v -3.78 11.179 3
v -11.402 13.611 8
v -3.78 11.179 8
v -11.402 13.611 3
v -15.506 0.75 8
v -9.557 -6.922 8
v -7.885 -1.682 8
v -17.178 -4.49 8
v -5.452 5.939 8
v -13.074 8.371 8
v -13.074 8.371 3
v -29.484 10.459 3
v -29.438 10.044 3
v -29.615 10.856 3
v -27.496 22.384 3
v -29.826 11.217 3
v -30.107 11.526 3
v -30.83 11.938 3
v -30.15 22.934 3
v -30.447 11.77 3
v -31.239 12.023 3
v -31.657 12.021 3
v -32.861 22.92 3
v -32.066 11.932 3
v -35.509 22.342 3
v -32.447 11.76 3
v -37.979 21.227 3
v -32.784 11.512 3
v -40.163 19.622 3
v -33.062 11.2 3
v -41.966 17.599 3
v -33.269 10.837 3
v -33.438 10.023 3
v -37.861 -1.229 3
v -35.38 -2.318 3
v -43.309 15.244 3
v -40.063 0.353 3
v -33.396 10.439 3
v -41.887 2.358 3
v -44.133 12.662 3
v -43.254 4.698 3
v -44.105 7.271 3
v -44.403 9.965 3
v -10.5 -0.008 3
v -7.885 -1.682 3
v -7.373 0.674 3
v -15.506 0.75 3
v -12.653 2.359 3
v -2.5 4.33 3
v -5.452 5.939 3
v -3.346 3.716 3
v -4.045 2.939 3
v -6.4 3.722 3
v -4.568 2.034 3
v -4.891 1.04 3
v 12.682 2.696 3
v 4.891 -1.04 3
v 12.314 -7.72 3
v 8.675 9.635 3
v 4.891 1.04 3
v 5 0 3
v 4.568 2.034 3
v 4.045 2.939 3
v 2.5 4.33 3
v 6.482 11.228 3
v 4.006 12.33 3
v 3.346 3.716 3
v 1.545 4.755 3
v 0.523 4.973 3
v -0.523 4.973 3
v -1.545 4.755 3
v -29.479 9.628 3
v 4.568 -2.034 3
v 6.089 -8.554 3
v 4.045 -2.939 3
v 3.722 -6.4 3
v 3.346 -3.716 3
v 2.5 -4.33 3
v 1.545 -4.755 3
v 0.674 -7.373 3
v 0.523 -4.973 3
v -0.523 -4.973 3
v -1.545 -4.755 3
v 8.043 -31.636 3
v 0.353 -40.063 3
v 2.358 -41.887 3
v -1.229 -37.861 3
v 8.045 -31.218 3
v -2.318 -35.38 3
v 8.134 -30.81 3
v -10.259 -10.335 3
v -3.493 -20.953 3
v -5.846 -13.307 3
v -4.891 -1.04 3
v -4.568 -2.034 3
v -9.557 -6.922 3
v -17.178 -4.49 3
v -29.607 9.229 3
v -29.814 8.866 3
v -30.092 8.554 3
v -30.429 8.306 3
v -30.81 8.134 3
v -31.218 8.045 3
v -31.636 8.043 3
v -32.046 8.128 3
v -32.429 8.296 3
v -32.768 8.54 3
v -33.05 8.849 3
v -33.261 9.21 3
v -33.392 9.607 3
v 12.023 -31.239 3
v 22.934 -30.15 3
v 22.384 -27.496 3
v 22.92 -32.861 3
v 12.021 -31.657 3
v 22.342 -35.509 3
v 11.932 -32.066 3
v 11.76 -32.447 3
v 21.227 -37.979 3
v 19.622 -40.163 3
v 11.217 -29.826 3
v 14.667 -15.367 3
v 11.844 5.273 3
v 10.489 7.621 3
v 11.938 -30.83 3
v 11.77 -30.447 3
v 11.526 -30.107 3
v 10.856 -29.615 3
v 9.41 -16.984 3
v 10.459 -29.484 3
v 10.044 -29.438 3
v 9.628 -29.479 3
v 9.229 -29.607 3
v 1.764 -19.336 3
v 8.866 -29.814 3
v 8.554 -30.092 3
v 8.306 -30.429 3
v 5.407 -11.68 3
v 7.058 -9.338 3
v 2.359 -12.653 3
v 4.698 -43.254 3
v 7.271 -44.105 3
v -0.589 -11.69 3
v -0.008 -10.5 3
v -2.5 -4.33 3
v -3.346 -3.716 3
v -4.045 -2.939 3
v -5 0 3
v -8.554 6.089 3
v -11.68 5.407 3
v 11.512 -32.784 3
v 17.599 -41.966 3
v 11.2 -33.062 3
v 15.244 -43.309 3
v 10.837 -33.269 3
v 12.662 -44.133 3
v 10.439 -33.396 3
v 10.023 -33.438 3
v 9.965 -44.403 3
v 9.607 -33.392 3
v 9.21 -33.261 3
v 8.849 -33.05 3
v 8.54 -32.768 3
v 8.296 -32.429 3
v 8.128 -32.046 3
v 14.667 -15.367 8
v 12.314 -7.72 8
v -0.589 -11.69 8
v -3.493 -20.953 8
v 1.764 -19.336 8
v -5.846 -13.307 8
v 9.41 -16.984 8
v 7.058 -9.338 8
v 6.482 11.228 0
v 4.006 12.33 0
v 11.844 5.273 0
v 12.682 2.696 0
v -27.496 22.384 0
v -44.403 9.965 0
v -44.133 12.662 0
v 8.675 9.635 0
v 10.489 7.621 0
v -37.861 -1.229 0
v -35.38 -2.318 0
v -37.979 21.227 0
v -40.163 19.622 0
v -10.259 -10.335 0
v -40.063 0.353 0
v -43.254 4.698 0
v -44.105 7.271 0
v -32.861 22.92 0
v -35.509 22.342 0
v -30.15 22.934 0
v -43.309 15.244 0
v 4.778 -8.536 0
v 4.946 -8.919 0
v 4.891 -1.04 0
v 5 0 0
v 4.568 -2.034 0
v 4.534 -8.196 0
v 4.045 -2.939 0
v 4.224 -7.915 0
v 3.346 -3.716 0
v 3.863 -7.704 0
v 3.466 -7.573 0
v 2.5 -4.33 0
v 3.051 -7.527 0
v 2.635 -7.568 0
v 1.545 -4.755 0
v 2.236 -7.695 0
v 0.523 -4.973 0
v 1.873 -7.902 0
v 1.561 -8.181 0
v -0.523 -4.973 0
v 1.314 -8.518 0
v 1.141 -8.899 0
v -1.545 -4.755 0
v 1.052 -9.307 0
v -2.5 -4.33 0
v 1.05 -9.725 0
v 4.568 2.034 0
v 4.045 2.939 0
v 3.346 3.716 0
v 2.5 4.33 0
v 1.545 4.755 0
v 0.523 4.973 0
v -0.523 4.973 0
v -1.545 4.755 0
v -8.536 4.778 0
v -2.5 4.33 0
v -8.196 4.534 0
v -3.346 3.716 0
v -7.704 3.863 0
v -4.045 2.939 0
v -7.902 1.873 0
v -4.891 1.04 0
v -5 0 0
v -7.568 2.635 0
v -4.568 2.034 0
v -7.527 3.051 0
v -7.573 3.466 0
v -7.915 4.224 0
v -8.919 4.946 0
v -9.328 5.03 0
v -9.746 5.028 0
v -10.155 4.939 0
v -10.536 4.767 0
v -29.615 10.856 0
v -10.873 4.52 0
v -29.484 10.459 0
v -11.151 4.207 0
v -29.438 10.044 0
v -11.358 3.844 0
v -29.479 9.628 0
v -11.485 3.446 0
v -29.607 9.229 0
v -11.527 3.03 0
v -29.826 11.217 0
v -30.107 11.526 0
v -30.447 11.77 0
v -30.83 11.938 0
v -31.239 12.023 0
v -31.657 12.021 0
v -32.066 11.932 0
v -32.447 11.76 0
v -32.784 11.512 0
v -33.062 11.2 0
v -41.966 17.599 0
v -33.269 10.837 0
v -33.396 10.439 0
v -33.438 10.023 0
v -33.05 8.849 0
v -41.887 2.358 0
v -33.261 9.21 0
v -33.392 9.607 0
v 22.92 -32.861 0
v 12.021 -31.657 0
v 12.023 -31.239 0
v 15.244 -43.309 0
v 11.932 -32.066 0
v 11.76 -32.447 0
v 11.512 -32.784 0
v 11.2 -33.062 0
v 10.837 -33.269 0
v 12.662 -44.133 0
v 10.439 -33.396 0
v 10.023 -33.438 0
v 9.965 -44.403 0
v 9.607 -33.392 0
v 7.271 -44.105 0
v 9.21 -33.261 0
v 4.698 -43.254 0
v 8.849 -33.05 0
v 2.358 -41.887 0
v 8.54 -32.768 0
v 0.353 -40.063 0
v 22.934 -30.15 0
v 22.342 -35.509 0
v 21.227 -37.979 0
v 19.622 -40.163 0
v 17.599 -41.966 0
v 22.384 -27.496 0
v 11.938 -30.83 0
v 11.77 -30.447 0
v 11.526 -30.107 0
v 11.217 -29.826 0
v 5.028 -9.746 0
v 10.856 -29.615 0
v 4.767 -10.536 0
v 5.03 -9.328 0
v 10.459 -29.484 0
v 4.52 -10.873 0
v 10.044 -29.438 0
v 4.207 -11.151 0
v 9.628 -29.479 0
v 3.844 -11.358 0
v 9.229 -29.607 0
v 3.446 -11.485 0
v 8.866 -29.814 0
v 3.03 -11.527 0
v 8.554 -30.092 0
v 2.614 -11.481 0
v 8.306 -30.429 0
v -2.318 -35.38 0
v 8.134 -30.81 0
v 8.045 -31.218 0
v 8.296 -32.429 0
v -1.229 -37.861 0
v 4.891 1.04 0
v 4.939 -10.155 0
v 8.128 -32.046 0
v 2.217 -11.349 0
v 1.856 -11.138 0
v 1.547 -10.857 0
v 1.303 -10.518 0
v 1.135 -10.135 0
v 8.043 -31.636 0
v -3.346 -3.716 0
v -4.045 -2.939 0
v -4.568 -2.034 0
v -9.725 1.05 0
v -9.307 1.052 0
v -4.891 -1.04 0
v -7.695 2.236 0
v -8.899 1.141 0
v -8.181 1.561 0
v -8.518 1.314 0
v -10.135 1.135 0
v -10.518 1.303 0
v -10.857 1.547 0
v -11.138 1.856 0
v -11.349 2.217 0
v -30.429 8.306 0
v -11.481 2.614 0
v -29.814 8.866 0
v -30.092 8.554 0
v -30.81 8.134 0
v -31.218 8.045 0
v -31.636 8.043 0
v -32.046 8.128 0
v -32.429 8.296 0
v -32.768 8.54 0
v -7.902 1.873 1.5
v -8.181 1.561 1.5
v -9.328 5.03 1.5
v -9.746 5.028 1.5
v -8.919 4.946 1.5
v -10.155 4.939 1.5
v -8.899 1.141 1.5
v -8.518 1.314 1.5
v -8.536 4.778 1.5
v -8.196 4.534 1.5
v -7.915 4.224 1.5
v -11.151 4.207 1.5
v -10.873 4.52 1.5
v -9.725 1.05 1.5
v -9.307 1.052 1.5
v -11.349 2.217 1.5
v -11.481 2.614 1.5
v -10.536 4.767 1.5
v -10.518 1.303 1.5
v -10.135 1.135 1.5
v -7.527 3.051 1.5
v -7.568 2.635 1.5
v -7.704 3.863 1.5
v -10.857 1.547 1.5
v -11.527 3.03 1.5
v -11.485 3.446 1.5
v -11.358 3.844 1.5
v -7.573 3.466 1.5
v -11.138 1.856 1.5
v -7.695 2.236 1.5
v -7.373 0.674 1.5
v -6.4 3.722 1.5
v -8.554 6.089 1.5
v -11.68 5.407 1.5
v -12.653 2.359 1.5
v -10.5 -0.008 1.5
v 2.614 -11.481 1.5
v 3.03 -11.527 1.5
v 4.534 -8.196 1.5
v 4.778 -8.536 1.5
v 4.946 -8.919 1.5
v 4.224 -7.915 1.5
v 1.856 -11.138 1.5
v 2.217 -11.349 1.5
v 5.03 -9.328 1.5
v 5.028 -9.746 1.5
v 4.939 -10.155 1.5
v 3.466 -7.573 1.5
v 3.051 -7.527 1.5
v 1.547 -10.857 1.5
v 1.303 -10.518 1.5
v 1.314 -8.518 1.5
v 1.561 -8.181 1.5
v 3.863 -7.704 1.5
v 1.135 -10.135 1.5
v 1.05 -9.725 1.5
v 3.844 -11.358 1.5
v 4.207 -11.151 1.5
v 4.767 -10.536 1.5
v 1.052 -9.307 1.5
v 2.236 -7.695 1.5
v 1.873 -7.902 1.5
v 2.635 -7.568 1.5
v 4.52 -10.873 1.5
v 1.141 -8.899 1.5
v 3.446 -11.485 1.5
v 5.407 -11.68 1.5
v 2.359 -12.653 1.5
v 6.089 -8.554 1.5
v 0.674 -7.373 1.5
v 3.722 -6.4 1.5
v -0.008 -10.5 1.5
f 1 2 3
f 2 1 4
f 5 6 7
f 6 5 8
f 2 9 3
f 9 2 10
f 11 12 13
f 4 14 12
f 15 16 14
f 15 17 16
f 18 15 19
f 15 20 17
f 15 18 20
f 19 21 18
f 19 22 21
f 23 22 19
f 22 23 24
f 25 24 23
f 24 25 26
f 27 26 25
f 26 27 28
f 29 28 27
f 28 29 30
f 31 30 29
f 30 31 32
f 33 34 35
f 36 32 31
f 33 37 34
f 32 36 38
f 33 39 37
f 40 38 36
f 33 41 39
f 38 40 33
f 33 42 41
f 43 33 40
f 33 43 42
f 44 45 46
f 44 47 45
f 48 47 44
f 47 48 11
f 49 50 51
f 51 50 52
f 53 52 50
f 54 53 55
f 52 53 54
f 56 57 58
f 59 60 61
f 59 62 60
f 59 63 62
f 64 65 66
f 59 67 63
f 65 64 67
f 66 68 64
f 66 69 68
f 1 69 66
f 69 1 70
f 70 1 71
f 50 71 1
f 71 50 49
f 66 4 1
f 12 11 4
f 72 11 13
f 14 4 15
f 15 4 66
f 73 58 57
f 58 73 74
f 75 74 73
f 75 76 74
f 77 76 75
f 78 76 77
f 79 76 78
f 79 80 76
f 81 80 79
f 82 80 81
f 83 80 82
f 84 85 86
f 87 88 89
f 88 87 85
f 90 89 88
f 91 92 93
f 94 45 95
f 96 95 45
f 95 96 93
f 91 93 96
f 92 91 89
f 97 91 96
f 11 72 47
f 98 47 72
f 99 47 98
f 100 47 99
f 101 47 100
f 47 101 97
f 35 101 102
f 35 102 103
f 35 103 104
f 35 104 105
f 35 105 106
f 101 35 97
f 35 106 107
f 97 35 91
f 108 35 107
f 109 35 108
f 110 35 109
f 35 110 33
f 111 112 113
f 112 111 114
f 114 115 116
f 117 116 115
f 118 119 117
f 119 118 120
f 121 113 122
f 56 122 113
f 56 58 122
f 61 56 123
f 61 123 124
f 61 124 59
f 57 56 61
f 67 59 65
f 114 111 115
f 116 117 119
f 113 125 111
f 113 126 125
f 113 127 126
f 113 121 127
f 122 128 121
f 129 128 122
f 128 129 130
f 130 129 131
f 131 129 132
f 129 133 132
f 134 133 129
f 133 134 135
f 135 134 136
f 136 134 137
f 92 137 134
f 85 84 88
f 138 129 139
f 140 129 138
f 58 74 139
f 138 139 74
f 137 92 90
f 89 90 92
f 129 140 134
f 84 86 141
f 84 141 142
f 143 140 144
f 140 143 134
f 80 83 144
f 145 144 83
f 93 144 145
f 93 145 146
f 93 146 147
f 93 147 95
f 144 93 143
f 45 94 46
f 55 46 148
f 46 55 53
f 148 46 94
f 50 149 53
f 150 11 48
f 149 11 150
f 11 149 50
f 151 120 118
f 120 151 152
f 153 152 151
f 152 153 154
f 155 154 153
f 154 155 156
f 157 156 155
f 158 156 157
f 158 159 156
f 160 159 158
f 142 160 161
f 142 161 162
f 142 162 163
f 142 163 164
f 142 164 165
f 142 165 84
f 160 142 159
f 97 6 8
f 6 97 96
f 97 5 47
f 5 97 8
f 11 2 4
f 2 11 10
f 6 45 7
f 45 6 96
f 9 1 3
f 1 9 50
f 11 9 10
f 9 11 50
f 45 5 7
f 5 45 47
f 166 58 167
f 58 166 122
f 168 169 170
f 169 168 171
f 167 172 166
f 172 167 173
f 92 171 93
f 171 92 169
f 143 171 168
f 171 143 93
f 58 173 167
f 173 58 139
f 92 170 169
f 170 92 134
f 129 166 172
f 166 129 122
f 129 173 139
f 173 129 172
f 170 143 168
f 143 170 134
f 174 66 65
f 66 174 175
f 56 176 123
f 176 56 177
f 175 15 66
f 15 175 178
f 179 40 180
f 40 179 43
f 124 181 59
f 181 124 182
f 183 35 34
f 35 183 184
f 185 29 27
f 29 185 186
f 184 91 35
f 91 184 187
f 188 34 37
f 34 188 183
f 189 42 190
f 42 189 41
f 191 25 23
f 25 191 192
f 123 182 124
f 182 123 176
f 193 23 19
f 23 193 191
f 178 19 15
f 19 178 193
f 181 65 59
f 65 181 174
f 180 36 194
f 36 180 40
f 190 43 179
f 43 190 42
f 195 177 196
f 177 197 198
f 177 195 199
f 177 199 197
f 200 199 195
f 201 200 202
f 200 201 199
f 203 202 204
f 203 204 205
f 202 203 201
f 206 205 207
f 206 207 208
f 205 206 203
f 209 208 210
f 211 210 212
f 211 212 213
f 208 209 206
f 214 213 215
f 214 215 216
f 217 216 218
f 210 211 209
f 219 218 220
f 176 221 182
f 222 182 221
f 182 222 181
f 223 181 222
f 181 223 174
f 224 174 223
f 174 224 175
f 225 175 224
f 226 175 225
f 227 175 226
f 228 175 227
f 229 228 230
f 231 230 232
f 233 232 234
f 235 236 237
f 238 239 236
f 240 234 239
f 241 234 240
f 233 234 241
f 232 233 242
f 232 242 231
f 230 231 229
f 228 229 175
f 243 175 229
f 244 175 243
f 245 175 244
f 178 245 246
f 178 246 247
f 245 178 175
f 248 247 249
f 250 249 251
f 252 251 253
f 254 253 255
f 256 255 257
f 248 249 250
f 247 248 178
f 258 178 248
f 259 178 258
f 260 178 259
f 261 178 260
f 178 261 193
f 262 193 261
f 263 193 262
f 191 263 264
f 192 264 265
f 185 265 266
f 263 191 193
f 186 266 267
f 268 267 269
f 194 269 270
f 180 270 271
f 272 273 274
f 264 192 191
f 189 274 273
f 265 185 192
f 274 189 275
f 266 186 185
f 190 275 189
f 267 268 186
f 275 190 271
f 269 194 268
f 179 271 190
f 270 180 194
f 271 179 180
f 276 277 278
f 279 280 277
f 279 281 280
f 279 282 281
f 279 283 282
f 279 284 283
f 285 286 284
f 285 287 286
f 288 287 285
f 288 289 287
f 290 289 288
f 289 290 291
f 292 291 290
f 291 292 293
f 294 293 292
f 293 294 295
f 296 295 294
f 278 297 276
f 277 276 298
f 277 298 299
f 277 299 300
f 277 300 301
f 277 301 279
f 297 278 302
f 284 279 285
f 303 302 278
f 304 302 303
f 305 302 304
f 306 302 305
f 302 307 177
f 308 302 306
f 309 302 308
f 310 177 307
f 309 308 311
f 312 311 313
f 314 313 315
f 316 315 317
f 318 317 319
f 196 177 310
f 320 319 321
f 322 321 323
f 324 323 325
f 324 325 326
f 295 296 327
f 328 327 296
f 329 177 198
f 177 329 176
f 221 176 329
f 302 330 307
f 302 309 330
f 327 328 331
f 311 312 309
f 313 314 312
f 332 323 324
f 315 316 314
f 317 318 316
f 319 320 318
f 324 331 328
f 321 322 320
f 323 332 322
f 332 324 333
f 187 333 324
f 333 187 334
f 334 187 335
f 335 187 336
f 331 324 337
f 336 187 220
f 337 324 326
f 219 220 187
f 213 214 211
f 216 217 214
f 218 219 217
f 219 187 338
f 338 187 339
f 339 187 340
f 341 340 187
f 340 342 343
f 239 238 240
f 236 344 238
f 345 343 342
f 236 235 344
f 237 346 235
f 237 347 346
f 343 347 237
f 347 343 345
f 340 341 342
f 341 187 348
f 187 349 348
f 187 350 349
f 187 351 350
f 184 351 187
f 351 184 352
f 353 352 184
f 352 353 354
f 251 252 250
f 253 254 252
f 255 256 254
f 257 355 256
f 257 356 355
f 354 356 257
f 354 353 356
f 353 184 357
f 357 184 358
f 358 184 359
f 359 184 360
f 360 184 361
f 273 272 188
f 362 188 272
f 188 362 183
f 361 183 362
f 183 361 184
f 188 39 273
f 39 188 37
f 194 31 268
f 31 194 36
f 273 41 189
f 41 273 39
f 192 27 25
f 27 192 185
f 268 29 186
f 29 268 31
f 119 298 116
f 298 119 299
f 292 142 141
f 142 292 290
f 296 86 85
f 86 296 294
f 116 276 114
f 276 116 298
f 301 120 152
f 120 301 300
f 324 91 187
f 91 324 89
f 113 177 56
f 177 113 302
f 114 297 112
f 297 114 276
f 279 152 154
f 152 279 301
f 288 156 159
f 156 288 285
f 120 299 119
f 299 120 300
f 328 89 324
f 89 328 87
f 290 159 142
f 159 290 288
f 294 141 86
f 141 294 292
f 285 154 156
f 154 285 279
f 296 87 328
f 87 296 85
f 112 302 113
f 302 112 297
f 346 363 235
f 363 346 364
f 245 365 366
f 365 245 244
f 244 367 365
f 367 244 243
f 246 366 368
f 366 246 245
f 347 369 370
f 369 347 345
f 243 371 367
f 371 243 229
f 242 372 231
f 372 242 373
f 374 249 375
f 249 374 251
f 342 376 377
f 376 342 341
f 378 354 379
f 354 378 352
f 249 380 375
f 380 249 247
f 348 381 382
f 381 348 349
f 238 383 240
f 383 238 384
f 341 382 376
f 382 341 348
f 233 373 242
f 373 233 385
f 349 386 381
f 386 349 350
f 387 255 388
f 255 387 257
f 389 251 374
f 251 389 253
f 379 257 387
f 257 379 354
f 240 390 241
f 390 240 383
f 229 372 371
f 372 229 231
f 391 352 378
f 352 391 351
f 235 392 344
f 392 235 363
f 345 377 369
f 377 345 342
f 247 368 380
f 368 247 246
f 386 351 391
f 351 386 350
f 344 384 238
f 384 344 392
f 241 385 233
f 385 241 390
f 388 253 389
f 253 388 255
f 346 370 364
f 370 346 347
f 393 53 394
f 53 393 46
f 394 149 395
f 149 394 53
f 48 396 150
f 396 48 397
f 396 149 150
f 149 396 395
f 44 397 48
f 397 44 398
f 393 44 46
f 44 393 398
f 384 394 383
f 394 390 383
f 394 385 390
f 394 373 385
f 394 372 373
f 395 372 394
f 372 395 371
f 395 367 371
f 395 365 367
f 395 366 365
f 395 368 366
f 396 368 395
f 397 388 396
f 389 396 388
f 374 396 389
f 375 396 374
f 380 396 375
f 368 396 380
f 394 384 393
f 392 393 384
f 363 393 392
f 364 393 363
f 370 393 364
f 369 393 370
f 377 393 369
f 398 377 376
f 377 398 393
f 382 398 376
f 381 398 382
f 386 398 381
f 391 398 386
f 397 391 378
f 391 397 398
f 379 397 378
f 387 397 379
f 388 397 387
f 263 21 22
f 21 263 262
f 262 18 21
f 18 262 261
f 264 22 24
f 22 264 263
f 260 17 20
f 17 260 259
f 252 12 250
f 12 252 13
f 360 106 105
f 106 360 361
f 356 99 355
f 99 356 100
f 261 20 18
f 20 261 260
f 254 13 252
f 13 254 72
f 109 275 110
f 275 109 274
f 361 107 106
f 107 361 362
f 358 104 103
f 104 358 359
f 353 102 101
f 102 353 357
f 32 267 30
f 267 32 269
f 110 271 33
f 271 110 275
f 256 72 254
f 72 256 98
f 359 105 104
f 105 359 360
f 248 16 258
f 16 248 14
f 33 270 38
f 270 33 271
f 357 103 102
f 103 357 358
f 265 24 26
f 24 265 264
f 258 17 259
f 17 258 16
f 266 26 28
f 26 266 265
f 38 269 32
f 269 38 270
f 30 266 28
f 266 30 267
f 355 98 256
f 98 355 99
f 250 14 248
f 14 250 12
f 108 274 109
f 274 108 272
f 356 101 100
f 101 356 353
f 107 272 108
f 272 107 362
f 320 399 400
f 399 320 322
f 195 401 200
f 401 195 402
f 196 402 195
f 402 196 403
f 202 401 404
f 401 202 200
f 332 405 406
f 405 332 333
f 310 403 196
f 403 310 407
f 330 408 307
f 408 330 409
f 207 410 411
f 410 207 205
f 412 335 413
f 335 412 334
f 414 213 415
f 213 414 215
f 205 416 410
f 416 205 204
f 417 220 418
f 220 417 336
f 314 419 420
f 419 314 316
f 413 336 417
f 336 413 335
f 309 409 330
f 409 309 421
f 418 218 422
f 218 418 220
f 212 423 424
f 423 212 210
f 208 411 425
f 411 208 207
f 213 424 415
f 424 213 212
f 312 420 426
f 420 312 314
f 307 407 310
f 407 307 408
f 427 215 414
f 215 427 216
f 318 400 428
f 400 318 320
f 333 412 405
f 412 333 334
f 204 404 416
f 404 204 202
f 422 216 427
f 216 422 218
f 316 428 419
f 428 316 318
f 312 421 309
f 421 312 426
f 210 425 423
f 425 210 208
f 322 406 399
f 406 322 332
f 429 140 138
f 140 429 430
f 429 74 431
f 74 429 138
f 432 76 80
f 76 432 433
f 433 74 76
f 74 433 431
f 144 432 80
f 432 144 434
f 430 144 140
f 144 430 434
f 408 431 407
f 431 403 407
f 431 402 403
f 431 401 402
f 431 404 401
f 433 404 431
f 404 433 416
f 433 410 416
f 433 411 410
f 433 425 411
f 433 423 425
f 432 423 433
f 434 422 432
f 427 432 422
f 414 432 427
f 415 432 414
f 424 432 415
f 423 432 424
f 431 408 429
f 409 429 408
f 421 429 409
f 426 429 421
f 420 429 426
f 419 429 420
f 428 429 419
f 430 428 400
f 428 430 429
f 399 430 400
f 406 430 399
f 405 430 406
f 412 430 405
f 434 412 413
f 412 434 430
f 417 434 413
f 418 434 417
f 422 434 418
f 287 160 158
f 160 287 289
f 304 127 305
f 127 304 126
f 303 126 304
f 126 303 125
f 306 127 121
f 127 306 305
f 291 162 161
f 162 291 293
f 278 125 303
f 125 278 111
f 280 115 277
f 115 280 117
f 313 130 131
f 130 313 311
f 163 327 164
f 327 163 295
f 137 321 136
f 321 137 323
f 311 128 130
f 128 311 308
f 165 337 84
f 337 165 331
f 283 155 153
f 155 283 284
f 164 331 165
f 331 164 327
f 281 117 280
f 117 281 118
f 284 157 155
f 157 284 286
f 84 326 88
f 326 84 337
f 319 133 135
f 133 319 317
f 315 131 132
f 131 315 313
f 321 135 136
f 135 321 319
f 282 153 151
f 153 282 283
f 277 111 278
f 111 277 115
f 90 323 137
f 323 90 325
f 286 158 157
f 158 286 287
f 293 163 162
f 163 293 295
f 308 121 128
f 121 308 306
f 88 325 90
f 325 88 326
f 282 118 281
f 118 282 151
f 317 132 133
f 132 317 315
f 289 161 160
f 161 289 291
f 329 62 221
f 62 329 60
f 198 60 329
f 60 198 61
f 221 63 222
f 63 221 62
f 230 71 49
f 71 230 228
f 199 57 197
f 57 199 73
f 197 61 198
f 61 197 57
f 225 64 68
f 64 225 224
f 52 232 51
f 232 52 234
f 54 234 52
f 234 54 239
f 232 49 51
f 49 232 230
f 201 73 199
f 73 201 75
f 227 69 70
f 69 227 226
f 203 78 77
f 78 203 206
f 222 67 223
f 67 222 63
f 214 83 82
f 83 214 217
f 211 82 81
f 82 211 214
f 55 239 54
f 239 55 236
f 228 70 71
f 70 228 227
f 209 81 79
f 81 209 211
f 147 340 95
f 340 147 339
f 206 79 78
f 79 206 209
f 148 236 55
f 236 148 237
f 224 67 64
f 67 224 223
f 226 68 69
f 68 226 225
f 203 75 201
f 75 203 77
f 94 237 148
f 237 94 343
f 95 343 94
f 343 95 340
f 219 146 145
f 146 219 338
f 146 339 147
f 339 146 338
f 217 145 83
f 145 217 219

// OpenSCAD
$fn = 30;

bx = 6.18;
by = 6.18;
bz = 3.5;
bgap = 3.75;
btab = 1.2; // height of button above body
wall = 4;
bezel = 3;
flangez = 1;
bheight = 2;
grid = 2.54;
pcbthk = 1.6;

braceheight = 5; // calculated to 4.7, but needs verification

rowx = bx+bgap+wall*2+4;
rowy = 4*(by+bgap)+2*grid+4;
row3y = 3*(by+bgap)+4;
echo(rowx);
echo(rowy);

*button_housing();
*row();
*for (i=[-1, 1, 0], j=[-1, 1])
    translate([i*15, j*10, 0])
        button_pad();
*xypad(); 

*xyback();
*zpad();
*row3();
*zpad2();
*zpad3();

*z2back();
*resetpad();

*xbutton_pad();
*translate([0, -10, 0]) ybutton_pad();
*translate([0, -20, 0]) zbutton_pad();

 resetback();

*fullback();

module fullback() {
    union() {
        xyback();
        translate([-38, -38, 0])
            resetback();
        translate([-50, -20, 1.5])
            rotate([0, 0, 72.3])
                cube([10, 30, 3], true);
        translate([-20, -50, 1.5])
            rotate([0, 0, 17.7])
                cube([10, 30, 3], true);
        translate([94, 0, 0])
            z2back();
        translate([78, 0, 1.5])
            cube([10, 20, 3], true);
    }
}

module body() {
    difference() {
       linear_extrude(height = 15) scale([1.1, 1.1, 1])
            import (file = "xypad.dxf");
       translate([0, 0, bezel])
            linear_extrude(height = 15-bezel) scale([0.9, 0.9, 1])
            import (file = "xypad.dxf");
    }
}

module xyback() {
    difference() {
        union() {
            linear_extrude(height = 5) scale([1.1, 1.1, 1])
                import (file = "xypad.dxf");
            for(i=[0, 1, 2, 3])
                rotate([0, 0, i*90])
                    translate([0, (rowx+rowy)/2, braceheight/2+5])
                        for(j=[-1, 1])
                            translate([j*(bx+bgap+wall)/2, 0, 0])
                                cube([wall-1, rowy, braceheight], true);
        }
        cylinder(r=8, h=12, center=true);
        
        for(i=[-1, 1], j=[-1, 1])
            translate([i*15, j*15, 0]) {
                cylinder(r=1.9, h=10, center=true);
                translate([0, 0, 2])
                    cylinder(r=3.2, h=4, $fn=6);
            }
            
        for(i=[-1, 1]) {
            translate([i*(rowy+rowx), 0, 0])
                cylinder(r=2, h=15, center=true);
            translate([0, i*(rowy+rowx), 0])
                cylinder(r=2, h=15, center=true);
        }

    }
}
    
module xypad() {
    union() {
        difference() {
            body();
            for(i=[0, 1, 2, 3])
                rotate([0, 0, i*90])
                    translate([0, rowy/2+bx+bgap, 0])
                        cube([rowx, rowy, bezel*3], true);;
            for(i=[-1, 1]) {
                translate([i*(rowy+rowx), 0, bezel])
                    cylinder(r=2.6, h=15);
                translate([0, i*(rowy+rowx), bezel])
                    cylinder(r=2.6, h=15);
            }
       }
        for(i=[0, 1, 2, 3])
            rotate([0, 0, i*90])
                translate([0, bx+bgap, 0])
                    row();
    }
    
}

module zpad() {
    union() {
        difference() {
            hull() {
                for (i=[-1, 1])
                    translate([0, i*(row3y-rowx+rowx/2+20)/2, 0])
                        cylinder(r=rowx/2+2, h=15);
            }
            translate([0, 0, 15/2+bezel])
                cube([rowx-4, row3y, 15], true);
            translate([0, 0, 0])
                cube([bx+bgap, row3y, 15], true);
            for (i=[-1, 1]) {
                translate([0, i*(row3y-rowx+rowx/2+20)/2, bezel])
                    cylinder(r=2.6, h=20);
           }
         }
        row3();
    }
}

module zpad2() {
    union() {
        difference() {
            hull() {
                for (i=[-1, 1])
                    translate([0, i*(row3y*2-rowx+rowx/2+24)/2, 0])
                        cylinder(r=rowx/2+2, h=15);
            }
            for (i=[-1, 1]) {
                translate([0, i*(row3y/2+2), 15/2+bezel])
                    cube([rowx-4, row3y, 15], true);
                translate([0, i*(row3y/2+2), 0])
                    cube([bx+bgap, row3y, 15], true);
            }
            for (i=[-1, 1]) {
                translate([0, i*(row3y*2-rowx+rowx/2+24)/2, bezel])
                    cylinder(r=2.6, h=20);
           }
         }
         for (i=[-1, 1])
             translate([0, i*(row3y/2+2), 0])
                 if (i == -1) {
                     rotate([0, 0, 180])
                        row3();
                 }
                 else {
                     row3();
                 }
    }
}

module zpad3() {
    mirror([1, 0,0])
    union() {
        //translate([0, 30, 0]) rotate([0, 0, 17.7]) cube([100, 4, 4], true);
        difference() {
            hull() {
                for (i=[-1, 1], j=[-1, 1])
                    translate([j*rowx, i*row3y/2+j*7, 0])
                        cylinder(r=10, h=15);
            }
            translate([0, 0, 5+bz+btab+bezel+flangez+pcbthk]) cube([30, row3y, 10], true);
            for (i=[-1, 1]) {
                translate([i*(rowx/2+2), i*4, 15/2+bezel])
                    cube([rowx-4, row3y, 15], true);
                translate([i*(rowx/2+2), i*4, 0])
                    cube([bx+bgap, row3y, 15], true);
            }
            translate([rowx, row3y/2+7, bezel])
                cylinder(r=2.6, h=20);
            translate([-rowx, -(row3y/2+7), bezel])
                cylinder(r=2.6, h=20);
    
         }
         for (i=[-1, 1])
             translate([i*(rowx/2+2), i*4, 0])
                 if (i == -1) {
                     rotate([0, 0, 180])
                        row3();
                 }
                 else {
                     row3();
                 }
    }
}

module z2back() {
    union() {
        difference() {
            hull() {
                for (i=[-1, 1])
                    translate([0, i*(row3y*2-rowx+rowx/2+24)/2, 0])
                        cylinder(r=rowx/2+2, h=3);
            }
            cylinder(r=5, h=10, center=true);
            for (i=[-1, 1]) {
                translate([0, i*(row3y*2-rowx+rowx/2+24)/2, 0])
                    cylinder(r=2, h=20, center=true);
                translate([0, i*10, 0]) {
                    cylinder(r=2, h=20, center=true);
                    translate([0, 0, 1.5])
                        cylinder(r=3.2, h=3, $fn=6);
                }
           }
         }
        for(i=[0, 1])
            rotate([0, 0, i*180])
                translate([0, (row3y/2+2), braceheight/2+3])
                    for(j=[-1, 1])
                        translate([j*(bx+bgap+wall)/2, 0, 0])
                            cube([wall-1, row3y-1, braceheight], true);
    }
}


module resetpad() {
    mirror()
    union() {
        difference() {
            union() {
                hull() {
                    cylinder(r=rowx/2+2, h=15);
                    rotate([0, 0, 72.3])
                        translate([0, 33, 0])
                            cylinder(r=rowx/2+2, h=15);
                }
                hull() {
                    cylinder(r=rowx/2+2, h=15);
                    rotate([0, 0, 17.7])
                        translate([0, -33, 0])
                            cylinder(r=rowx/2+2, h=15);
                }
            }
            
            cube([bx+bgap, by+bgap, 10], true);
            rotate([0, 0, 72.3])
                translate([0, 20, 0])
                    rotate([0, 0, -72.3])
                        cube([bx+bgap, by+bgap, 10], true);
            rotate([0, 0, 17.7])
                translate([0, -20, 0])
                    rotate([0, 0, -17.7])
                        cube([bx+bgap, by+bgap, 10], true);
            
            translate([0, 0, bezel]) union() {
                hull() {
                    cylinder(r=rowx/2+2-3, h=15);
                    rotate([0, 0, 72.3])
                        translate([0, 20, 0])
                            cylinder(r=rowx/2+2-3, h=15);
                }
                hull() {
                    cylinder(r=rowx/2+2-3, h=15);
                    rotate([0, 0, 17.7])
                        translate([0, -20, 0])
                            cylinder(r=rowx/2+2-3, h=15);
                }
            }
            rotate([0, 0, 72.3])
                translate([0, 33, bezel])
                cylinder(r=2.6, h=15);
            rotate([0, 0, 17.7])
                translate([0, -33, bezel])
                cylinder(r=2.6, h=15);

        }

        
        translate([0, -(by+bgap)/2, 0]) {
            buttony_housing();
            rotate([0, 0, 72.3])
                translate([0, 20, 0])
                    rotate([0, 0, -72.3])
                        buttonx_housing();
            rotate([0, 0, 17.7])
                translate([0, -20, 0])
                    rotate([0, 0, -17.7])
                        buttonz_housing();
        }
    }
}

module resetback() {
    union() {
        difference() {
            union() {
                hull() {
                    cylinder(r=rowx/2+2, h=3);
                    rotate([0, 0, 72.3])
                        translate([0, 33, 0])
                            cylinder(r=rowx/2+2, h=3);
                }
                hull() {
                    cylinder(r=rowx/2+2, h=3);
                    rotate([0, 0, 17.7])
                        translate([0, -33, 0])
                            cylinder(r=rowx/2+2, h=3);
                }
                rotate([0, 0, 72.3])
                    translate([0, 11, 3+braceheight/2])
                        difference() {
                            cube([19, 8, braceheight], true);
                            cube([8, 10, braceheight+1], true);
                        }
                rotate([0, 0, 17.1])
                    translate([0, -15, 3+braceheight/2])
                        difference() {
                            cube([19, 8, braceheight], true);
                            cube([8, 10, braceheight+1], true);
                        }
            }
        
            cylinder(r=5, h=10, center=true);
            rotate([0, 0, 72.3]) {
                translate([0, 10, 0]) {
                    cylinder(r=2, h=10, center=true);
                    translate([0, 0, 1.5])
                        cylinder(r=3.2, h=10, $fn=6);
                }
                translate([0, 33, 0])
                    cylinder(r=2, h=10, center=true);
            }
            rotate([0, 0, 17.7]) {
                translate([0, -10, 0]) {
                    cylinder(r=2, h=10, center=true);
                    translate([0, 0, 1.5])
                        cylinder(r=3.2, h=10, $fn=6);
                }
                translate([0, -33, 0])
                    cylinder(r=2, h=10, center=true);
            }
       }
    }
}

module row() {    
    translate([0, 2, 0])
    union() {
        for(i=[0, 1, 2])
            translate([0, i*(by+bgap), 0])
                button_housing();
        translate([0, 3*(by+bgap)+2*grid, 0])
            button_housing();
        translate([0, 3*(by+bgap)+grid, bezel/2])
            cube([bx+bgap+wall*2, 2*grid, bezel], true);
   
        for(i=[-1, 1]) {
            translate([i*((bx+bgap+wall*2)/2+1), (4*(by+bgap)+2*grid)/2, (bz+btab+bezel+flangez+pcbthk)/2])
                cube([2, 4*(by+bgap)+2*grid, bz+btab+bezel+flangez+pcbthk], true);
            translate([0, (i+1)*((4*(by+bgap)+2*grid)/2)+i, (bz+btab+bezel+flangez+pcbthk)/2])
                cube([bx+bgap+wall*2+4, 2, bz+btab+bezel+flangez+pcbthk], true);
        }
    }
}

module row3() {    
    union() {
        translate([0, -(by+bgap)/2, 0])
            for (i=[-1, 0, 1]) {
            translate([0, i*(by+bgap), 0])
                button_housing();
            }
   
        for(i=[-1, 1]) {
            translate([i*((bx+bgap+wall*2)/2+1), 0, (bz+btab+bezel+flangez+pcbthk)/2])
                cube([2, 3*(by+bgap), bz+btab+bezel+flangez+pcbthk], true);
            translate([0, i*((3*(by+bgap))/2+1), (bz+btab+bezel+flangez+pcbthk)/2])
                cube([bx+bgap+wall*2+4, 2, bz+btab+bezel+flangez+pcbthk], true);
        }
    }
}

module button_housing() {
    translate([0, (by+bgap)/2, (bz+btab+bezel+flangez)/2])
        difference() {
            cube([bx+bgap+wall*2, by+bgap, bz+btab+bezel+flangez], true);
            translate([0, 0, bezel/2])
                cube([bx+bgap, by+bgap+1, bz+btab+flangez+.001], true);
            translate([0, -1, 0])
                tri_prism(sc=1.55);
        }
}

module buttony_housing() {
    translate([0, (by+bgap)/2, (bz+btab+bezel+flangez)/2])
        difference() {
            cube([bx+bgap+wall*2, by+bgap, bz+btab+bezel+flangez], true);
            translate([0, 0, bezel/2])
                cube([bx+bgap, by+bgap+1, bz+btab+flangez+.001], true);
            translate([0, 0, 0])
                y_prism(sc=1.55);
        }
}

module buttonx_housing() {
    translate([0, (by+bgap)/2, (bz+btab+bezel+flangez)/2])
        difference() {
            cube([bx+bgap+wall*2, by+bgap, bz+btab+bezel+flangez], true);
            translate([0, 0, bezel/2])
                cube([bx+bgap, by+bgap+1, bz+btab+flangez+.001], true);
            translate([0, 0, 0])
                x_prism(sc=1.55);
        }
}

module buttonz_housing() {
    translate([0, (by+bgap)/2, (bz+btab+bezel+flangez)/2])
        difference() {
            cube([bx+bgap+wall*2, by+bgap, bz+btab+bezel+flangez], true);
            translate([0, 0, bezel/2])
                cube([bx+bgap, by+bgap+1, bz+btab+flangez+.001], true);
            translate([0, 0, 0])
                z_prism(sc=1.55);
        }
}

module button_pad() {
    union() {
        translate([0, 0, (bezel+bheight)/2+flangez])
            tri_prism(ht=bezel+bheight, sc=1.2);
        translate([0, 0, flangez/2])
            cube([bx+bgap-1.5, by+bgap-1.5, flangez], true);
    }
}

module xbutton_pad() {
    union() {
        translate([0, 0, (bezel+bheight)/2+flangez])
            x_prism(ht=bezel+bheight, sc=1.2);
        translate([0, 0, flangez/2])
            cube([bx+bgap-1.5, by+bgap-1.5, flangez], true);
    }
}

module ybutton_pad() {
    union() {
        translate([0, 1.5, (bezel+bheight)/2+flangez])
            y_prism(ht=bezel+bheight, sc=1.2);
        translate([0, 0, flangez/2])
            cube([bx+bgap-1.5, by+bgap-1.5, flangez], true);
    }
}

module zbutton_pad() {
    union() {
        translate([0, 0, (bezel+bheight)/2+flangez])
            z_prism(ht=bezel+bheight, sc=1.2);
        translate([0, 0, flangez/2])
            cube([bx+bgap-1.5, by+bgap-1.5, flangez], true);
    }
}


module tri_prism(ht=10, sc=1) {
    translate([0, 0, -ht/2])
        linear_extrude(height=ht)
            scale([sc, sc, 1])
            polygon(points=[ [0, 3.33], [-2.89, -1.67], [2.89, -1.67]]);
}

module y_prism(ht=10, sc=1) {
    translate([0, 0, -ht/2])
        linear_extrude(height=ht)
            scale([sc, sc, 1])
            polygon(points=[ [0, 0], [-0.65, 1.1], [-2.9, 1.1], [-1.125, -1.9], [-1.125, -3.9], [1.125, -3.9], [1.125, -1.9], [2.9, 1.1], [0.65, 1.1] ]);
}

module x_prism(ht=10, sc=1) {
    translate([0, 0, -ht/2])
        linear_extrude(height=ht)
            scale([sc, sc, 1])
            polygon(points=[ [-2.9, 2.5], [-1, 0], [-2.9, -2.5], [-0.9, -2.5], [0, -1.28], [0.9, -2.5], [2.9, -2.5], [1, 0], [2.9, 2.5], [0.9, 2.5], [0, 1.28], [-0.9, 2.5] ]);
}

module z_prism(ht=10, sc=1) {
    translate([0, 0, -ht/2])
        linear_extrude(height=ht)
            scale([sc, sc, 1])
            polygon(points=[ [-2.7, 2.5], [-2.7, 1], [0.16, 1], [-2.7, -1], [-2.7, -2.5], [2.7, -2.5], [2.7, -1], [-0.16, -1], [2.7, 1], [2.7, 2.5] ]);
}
